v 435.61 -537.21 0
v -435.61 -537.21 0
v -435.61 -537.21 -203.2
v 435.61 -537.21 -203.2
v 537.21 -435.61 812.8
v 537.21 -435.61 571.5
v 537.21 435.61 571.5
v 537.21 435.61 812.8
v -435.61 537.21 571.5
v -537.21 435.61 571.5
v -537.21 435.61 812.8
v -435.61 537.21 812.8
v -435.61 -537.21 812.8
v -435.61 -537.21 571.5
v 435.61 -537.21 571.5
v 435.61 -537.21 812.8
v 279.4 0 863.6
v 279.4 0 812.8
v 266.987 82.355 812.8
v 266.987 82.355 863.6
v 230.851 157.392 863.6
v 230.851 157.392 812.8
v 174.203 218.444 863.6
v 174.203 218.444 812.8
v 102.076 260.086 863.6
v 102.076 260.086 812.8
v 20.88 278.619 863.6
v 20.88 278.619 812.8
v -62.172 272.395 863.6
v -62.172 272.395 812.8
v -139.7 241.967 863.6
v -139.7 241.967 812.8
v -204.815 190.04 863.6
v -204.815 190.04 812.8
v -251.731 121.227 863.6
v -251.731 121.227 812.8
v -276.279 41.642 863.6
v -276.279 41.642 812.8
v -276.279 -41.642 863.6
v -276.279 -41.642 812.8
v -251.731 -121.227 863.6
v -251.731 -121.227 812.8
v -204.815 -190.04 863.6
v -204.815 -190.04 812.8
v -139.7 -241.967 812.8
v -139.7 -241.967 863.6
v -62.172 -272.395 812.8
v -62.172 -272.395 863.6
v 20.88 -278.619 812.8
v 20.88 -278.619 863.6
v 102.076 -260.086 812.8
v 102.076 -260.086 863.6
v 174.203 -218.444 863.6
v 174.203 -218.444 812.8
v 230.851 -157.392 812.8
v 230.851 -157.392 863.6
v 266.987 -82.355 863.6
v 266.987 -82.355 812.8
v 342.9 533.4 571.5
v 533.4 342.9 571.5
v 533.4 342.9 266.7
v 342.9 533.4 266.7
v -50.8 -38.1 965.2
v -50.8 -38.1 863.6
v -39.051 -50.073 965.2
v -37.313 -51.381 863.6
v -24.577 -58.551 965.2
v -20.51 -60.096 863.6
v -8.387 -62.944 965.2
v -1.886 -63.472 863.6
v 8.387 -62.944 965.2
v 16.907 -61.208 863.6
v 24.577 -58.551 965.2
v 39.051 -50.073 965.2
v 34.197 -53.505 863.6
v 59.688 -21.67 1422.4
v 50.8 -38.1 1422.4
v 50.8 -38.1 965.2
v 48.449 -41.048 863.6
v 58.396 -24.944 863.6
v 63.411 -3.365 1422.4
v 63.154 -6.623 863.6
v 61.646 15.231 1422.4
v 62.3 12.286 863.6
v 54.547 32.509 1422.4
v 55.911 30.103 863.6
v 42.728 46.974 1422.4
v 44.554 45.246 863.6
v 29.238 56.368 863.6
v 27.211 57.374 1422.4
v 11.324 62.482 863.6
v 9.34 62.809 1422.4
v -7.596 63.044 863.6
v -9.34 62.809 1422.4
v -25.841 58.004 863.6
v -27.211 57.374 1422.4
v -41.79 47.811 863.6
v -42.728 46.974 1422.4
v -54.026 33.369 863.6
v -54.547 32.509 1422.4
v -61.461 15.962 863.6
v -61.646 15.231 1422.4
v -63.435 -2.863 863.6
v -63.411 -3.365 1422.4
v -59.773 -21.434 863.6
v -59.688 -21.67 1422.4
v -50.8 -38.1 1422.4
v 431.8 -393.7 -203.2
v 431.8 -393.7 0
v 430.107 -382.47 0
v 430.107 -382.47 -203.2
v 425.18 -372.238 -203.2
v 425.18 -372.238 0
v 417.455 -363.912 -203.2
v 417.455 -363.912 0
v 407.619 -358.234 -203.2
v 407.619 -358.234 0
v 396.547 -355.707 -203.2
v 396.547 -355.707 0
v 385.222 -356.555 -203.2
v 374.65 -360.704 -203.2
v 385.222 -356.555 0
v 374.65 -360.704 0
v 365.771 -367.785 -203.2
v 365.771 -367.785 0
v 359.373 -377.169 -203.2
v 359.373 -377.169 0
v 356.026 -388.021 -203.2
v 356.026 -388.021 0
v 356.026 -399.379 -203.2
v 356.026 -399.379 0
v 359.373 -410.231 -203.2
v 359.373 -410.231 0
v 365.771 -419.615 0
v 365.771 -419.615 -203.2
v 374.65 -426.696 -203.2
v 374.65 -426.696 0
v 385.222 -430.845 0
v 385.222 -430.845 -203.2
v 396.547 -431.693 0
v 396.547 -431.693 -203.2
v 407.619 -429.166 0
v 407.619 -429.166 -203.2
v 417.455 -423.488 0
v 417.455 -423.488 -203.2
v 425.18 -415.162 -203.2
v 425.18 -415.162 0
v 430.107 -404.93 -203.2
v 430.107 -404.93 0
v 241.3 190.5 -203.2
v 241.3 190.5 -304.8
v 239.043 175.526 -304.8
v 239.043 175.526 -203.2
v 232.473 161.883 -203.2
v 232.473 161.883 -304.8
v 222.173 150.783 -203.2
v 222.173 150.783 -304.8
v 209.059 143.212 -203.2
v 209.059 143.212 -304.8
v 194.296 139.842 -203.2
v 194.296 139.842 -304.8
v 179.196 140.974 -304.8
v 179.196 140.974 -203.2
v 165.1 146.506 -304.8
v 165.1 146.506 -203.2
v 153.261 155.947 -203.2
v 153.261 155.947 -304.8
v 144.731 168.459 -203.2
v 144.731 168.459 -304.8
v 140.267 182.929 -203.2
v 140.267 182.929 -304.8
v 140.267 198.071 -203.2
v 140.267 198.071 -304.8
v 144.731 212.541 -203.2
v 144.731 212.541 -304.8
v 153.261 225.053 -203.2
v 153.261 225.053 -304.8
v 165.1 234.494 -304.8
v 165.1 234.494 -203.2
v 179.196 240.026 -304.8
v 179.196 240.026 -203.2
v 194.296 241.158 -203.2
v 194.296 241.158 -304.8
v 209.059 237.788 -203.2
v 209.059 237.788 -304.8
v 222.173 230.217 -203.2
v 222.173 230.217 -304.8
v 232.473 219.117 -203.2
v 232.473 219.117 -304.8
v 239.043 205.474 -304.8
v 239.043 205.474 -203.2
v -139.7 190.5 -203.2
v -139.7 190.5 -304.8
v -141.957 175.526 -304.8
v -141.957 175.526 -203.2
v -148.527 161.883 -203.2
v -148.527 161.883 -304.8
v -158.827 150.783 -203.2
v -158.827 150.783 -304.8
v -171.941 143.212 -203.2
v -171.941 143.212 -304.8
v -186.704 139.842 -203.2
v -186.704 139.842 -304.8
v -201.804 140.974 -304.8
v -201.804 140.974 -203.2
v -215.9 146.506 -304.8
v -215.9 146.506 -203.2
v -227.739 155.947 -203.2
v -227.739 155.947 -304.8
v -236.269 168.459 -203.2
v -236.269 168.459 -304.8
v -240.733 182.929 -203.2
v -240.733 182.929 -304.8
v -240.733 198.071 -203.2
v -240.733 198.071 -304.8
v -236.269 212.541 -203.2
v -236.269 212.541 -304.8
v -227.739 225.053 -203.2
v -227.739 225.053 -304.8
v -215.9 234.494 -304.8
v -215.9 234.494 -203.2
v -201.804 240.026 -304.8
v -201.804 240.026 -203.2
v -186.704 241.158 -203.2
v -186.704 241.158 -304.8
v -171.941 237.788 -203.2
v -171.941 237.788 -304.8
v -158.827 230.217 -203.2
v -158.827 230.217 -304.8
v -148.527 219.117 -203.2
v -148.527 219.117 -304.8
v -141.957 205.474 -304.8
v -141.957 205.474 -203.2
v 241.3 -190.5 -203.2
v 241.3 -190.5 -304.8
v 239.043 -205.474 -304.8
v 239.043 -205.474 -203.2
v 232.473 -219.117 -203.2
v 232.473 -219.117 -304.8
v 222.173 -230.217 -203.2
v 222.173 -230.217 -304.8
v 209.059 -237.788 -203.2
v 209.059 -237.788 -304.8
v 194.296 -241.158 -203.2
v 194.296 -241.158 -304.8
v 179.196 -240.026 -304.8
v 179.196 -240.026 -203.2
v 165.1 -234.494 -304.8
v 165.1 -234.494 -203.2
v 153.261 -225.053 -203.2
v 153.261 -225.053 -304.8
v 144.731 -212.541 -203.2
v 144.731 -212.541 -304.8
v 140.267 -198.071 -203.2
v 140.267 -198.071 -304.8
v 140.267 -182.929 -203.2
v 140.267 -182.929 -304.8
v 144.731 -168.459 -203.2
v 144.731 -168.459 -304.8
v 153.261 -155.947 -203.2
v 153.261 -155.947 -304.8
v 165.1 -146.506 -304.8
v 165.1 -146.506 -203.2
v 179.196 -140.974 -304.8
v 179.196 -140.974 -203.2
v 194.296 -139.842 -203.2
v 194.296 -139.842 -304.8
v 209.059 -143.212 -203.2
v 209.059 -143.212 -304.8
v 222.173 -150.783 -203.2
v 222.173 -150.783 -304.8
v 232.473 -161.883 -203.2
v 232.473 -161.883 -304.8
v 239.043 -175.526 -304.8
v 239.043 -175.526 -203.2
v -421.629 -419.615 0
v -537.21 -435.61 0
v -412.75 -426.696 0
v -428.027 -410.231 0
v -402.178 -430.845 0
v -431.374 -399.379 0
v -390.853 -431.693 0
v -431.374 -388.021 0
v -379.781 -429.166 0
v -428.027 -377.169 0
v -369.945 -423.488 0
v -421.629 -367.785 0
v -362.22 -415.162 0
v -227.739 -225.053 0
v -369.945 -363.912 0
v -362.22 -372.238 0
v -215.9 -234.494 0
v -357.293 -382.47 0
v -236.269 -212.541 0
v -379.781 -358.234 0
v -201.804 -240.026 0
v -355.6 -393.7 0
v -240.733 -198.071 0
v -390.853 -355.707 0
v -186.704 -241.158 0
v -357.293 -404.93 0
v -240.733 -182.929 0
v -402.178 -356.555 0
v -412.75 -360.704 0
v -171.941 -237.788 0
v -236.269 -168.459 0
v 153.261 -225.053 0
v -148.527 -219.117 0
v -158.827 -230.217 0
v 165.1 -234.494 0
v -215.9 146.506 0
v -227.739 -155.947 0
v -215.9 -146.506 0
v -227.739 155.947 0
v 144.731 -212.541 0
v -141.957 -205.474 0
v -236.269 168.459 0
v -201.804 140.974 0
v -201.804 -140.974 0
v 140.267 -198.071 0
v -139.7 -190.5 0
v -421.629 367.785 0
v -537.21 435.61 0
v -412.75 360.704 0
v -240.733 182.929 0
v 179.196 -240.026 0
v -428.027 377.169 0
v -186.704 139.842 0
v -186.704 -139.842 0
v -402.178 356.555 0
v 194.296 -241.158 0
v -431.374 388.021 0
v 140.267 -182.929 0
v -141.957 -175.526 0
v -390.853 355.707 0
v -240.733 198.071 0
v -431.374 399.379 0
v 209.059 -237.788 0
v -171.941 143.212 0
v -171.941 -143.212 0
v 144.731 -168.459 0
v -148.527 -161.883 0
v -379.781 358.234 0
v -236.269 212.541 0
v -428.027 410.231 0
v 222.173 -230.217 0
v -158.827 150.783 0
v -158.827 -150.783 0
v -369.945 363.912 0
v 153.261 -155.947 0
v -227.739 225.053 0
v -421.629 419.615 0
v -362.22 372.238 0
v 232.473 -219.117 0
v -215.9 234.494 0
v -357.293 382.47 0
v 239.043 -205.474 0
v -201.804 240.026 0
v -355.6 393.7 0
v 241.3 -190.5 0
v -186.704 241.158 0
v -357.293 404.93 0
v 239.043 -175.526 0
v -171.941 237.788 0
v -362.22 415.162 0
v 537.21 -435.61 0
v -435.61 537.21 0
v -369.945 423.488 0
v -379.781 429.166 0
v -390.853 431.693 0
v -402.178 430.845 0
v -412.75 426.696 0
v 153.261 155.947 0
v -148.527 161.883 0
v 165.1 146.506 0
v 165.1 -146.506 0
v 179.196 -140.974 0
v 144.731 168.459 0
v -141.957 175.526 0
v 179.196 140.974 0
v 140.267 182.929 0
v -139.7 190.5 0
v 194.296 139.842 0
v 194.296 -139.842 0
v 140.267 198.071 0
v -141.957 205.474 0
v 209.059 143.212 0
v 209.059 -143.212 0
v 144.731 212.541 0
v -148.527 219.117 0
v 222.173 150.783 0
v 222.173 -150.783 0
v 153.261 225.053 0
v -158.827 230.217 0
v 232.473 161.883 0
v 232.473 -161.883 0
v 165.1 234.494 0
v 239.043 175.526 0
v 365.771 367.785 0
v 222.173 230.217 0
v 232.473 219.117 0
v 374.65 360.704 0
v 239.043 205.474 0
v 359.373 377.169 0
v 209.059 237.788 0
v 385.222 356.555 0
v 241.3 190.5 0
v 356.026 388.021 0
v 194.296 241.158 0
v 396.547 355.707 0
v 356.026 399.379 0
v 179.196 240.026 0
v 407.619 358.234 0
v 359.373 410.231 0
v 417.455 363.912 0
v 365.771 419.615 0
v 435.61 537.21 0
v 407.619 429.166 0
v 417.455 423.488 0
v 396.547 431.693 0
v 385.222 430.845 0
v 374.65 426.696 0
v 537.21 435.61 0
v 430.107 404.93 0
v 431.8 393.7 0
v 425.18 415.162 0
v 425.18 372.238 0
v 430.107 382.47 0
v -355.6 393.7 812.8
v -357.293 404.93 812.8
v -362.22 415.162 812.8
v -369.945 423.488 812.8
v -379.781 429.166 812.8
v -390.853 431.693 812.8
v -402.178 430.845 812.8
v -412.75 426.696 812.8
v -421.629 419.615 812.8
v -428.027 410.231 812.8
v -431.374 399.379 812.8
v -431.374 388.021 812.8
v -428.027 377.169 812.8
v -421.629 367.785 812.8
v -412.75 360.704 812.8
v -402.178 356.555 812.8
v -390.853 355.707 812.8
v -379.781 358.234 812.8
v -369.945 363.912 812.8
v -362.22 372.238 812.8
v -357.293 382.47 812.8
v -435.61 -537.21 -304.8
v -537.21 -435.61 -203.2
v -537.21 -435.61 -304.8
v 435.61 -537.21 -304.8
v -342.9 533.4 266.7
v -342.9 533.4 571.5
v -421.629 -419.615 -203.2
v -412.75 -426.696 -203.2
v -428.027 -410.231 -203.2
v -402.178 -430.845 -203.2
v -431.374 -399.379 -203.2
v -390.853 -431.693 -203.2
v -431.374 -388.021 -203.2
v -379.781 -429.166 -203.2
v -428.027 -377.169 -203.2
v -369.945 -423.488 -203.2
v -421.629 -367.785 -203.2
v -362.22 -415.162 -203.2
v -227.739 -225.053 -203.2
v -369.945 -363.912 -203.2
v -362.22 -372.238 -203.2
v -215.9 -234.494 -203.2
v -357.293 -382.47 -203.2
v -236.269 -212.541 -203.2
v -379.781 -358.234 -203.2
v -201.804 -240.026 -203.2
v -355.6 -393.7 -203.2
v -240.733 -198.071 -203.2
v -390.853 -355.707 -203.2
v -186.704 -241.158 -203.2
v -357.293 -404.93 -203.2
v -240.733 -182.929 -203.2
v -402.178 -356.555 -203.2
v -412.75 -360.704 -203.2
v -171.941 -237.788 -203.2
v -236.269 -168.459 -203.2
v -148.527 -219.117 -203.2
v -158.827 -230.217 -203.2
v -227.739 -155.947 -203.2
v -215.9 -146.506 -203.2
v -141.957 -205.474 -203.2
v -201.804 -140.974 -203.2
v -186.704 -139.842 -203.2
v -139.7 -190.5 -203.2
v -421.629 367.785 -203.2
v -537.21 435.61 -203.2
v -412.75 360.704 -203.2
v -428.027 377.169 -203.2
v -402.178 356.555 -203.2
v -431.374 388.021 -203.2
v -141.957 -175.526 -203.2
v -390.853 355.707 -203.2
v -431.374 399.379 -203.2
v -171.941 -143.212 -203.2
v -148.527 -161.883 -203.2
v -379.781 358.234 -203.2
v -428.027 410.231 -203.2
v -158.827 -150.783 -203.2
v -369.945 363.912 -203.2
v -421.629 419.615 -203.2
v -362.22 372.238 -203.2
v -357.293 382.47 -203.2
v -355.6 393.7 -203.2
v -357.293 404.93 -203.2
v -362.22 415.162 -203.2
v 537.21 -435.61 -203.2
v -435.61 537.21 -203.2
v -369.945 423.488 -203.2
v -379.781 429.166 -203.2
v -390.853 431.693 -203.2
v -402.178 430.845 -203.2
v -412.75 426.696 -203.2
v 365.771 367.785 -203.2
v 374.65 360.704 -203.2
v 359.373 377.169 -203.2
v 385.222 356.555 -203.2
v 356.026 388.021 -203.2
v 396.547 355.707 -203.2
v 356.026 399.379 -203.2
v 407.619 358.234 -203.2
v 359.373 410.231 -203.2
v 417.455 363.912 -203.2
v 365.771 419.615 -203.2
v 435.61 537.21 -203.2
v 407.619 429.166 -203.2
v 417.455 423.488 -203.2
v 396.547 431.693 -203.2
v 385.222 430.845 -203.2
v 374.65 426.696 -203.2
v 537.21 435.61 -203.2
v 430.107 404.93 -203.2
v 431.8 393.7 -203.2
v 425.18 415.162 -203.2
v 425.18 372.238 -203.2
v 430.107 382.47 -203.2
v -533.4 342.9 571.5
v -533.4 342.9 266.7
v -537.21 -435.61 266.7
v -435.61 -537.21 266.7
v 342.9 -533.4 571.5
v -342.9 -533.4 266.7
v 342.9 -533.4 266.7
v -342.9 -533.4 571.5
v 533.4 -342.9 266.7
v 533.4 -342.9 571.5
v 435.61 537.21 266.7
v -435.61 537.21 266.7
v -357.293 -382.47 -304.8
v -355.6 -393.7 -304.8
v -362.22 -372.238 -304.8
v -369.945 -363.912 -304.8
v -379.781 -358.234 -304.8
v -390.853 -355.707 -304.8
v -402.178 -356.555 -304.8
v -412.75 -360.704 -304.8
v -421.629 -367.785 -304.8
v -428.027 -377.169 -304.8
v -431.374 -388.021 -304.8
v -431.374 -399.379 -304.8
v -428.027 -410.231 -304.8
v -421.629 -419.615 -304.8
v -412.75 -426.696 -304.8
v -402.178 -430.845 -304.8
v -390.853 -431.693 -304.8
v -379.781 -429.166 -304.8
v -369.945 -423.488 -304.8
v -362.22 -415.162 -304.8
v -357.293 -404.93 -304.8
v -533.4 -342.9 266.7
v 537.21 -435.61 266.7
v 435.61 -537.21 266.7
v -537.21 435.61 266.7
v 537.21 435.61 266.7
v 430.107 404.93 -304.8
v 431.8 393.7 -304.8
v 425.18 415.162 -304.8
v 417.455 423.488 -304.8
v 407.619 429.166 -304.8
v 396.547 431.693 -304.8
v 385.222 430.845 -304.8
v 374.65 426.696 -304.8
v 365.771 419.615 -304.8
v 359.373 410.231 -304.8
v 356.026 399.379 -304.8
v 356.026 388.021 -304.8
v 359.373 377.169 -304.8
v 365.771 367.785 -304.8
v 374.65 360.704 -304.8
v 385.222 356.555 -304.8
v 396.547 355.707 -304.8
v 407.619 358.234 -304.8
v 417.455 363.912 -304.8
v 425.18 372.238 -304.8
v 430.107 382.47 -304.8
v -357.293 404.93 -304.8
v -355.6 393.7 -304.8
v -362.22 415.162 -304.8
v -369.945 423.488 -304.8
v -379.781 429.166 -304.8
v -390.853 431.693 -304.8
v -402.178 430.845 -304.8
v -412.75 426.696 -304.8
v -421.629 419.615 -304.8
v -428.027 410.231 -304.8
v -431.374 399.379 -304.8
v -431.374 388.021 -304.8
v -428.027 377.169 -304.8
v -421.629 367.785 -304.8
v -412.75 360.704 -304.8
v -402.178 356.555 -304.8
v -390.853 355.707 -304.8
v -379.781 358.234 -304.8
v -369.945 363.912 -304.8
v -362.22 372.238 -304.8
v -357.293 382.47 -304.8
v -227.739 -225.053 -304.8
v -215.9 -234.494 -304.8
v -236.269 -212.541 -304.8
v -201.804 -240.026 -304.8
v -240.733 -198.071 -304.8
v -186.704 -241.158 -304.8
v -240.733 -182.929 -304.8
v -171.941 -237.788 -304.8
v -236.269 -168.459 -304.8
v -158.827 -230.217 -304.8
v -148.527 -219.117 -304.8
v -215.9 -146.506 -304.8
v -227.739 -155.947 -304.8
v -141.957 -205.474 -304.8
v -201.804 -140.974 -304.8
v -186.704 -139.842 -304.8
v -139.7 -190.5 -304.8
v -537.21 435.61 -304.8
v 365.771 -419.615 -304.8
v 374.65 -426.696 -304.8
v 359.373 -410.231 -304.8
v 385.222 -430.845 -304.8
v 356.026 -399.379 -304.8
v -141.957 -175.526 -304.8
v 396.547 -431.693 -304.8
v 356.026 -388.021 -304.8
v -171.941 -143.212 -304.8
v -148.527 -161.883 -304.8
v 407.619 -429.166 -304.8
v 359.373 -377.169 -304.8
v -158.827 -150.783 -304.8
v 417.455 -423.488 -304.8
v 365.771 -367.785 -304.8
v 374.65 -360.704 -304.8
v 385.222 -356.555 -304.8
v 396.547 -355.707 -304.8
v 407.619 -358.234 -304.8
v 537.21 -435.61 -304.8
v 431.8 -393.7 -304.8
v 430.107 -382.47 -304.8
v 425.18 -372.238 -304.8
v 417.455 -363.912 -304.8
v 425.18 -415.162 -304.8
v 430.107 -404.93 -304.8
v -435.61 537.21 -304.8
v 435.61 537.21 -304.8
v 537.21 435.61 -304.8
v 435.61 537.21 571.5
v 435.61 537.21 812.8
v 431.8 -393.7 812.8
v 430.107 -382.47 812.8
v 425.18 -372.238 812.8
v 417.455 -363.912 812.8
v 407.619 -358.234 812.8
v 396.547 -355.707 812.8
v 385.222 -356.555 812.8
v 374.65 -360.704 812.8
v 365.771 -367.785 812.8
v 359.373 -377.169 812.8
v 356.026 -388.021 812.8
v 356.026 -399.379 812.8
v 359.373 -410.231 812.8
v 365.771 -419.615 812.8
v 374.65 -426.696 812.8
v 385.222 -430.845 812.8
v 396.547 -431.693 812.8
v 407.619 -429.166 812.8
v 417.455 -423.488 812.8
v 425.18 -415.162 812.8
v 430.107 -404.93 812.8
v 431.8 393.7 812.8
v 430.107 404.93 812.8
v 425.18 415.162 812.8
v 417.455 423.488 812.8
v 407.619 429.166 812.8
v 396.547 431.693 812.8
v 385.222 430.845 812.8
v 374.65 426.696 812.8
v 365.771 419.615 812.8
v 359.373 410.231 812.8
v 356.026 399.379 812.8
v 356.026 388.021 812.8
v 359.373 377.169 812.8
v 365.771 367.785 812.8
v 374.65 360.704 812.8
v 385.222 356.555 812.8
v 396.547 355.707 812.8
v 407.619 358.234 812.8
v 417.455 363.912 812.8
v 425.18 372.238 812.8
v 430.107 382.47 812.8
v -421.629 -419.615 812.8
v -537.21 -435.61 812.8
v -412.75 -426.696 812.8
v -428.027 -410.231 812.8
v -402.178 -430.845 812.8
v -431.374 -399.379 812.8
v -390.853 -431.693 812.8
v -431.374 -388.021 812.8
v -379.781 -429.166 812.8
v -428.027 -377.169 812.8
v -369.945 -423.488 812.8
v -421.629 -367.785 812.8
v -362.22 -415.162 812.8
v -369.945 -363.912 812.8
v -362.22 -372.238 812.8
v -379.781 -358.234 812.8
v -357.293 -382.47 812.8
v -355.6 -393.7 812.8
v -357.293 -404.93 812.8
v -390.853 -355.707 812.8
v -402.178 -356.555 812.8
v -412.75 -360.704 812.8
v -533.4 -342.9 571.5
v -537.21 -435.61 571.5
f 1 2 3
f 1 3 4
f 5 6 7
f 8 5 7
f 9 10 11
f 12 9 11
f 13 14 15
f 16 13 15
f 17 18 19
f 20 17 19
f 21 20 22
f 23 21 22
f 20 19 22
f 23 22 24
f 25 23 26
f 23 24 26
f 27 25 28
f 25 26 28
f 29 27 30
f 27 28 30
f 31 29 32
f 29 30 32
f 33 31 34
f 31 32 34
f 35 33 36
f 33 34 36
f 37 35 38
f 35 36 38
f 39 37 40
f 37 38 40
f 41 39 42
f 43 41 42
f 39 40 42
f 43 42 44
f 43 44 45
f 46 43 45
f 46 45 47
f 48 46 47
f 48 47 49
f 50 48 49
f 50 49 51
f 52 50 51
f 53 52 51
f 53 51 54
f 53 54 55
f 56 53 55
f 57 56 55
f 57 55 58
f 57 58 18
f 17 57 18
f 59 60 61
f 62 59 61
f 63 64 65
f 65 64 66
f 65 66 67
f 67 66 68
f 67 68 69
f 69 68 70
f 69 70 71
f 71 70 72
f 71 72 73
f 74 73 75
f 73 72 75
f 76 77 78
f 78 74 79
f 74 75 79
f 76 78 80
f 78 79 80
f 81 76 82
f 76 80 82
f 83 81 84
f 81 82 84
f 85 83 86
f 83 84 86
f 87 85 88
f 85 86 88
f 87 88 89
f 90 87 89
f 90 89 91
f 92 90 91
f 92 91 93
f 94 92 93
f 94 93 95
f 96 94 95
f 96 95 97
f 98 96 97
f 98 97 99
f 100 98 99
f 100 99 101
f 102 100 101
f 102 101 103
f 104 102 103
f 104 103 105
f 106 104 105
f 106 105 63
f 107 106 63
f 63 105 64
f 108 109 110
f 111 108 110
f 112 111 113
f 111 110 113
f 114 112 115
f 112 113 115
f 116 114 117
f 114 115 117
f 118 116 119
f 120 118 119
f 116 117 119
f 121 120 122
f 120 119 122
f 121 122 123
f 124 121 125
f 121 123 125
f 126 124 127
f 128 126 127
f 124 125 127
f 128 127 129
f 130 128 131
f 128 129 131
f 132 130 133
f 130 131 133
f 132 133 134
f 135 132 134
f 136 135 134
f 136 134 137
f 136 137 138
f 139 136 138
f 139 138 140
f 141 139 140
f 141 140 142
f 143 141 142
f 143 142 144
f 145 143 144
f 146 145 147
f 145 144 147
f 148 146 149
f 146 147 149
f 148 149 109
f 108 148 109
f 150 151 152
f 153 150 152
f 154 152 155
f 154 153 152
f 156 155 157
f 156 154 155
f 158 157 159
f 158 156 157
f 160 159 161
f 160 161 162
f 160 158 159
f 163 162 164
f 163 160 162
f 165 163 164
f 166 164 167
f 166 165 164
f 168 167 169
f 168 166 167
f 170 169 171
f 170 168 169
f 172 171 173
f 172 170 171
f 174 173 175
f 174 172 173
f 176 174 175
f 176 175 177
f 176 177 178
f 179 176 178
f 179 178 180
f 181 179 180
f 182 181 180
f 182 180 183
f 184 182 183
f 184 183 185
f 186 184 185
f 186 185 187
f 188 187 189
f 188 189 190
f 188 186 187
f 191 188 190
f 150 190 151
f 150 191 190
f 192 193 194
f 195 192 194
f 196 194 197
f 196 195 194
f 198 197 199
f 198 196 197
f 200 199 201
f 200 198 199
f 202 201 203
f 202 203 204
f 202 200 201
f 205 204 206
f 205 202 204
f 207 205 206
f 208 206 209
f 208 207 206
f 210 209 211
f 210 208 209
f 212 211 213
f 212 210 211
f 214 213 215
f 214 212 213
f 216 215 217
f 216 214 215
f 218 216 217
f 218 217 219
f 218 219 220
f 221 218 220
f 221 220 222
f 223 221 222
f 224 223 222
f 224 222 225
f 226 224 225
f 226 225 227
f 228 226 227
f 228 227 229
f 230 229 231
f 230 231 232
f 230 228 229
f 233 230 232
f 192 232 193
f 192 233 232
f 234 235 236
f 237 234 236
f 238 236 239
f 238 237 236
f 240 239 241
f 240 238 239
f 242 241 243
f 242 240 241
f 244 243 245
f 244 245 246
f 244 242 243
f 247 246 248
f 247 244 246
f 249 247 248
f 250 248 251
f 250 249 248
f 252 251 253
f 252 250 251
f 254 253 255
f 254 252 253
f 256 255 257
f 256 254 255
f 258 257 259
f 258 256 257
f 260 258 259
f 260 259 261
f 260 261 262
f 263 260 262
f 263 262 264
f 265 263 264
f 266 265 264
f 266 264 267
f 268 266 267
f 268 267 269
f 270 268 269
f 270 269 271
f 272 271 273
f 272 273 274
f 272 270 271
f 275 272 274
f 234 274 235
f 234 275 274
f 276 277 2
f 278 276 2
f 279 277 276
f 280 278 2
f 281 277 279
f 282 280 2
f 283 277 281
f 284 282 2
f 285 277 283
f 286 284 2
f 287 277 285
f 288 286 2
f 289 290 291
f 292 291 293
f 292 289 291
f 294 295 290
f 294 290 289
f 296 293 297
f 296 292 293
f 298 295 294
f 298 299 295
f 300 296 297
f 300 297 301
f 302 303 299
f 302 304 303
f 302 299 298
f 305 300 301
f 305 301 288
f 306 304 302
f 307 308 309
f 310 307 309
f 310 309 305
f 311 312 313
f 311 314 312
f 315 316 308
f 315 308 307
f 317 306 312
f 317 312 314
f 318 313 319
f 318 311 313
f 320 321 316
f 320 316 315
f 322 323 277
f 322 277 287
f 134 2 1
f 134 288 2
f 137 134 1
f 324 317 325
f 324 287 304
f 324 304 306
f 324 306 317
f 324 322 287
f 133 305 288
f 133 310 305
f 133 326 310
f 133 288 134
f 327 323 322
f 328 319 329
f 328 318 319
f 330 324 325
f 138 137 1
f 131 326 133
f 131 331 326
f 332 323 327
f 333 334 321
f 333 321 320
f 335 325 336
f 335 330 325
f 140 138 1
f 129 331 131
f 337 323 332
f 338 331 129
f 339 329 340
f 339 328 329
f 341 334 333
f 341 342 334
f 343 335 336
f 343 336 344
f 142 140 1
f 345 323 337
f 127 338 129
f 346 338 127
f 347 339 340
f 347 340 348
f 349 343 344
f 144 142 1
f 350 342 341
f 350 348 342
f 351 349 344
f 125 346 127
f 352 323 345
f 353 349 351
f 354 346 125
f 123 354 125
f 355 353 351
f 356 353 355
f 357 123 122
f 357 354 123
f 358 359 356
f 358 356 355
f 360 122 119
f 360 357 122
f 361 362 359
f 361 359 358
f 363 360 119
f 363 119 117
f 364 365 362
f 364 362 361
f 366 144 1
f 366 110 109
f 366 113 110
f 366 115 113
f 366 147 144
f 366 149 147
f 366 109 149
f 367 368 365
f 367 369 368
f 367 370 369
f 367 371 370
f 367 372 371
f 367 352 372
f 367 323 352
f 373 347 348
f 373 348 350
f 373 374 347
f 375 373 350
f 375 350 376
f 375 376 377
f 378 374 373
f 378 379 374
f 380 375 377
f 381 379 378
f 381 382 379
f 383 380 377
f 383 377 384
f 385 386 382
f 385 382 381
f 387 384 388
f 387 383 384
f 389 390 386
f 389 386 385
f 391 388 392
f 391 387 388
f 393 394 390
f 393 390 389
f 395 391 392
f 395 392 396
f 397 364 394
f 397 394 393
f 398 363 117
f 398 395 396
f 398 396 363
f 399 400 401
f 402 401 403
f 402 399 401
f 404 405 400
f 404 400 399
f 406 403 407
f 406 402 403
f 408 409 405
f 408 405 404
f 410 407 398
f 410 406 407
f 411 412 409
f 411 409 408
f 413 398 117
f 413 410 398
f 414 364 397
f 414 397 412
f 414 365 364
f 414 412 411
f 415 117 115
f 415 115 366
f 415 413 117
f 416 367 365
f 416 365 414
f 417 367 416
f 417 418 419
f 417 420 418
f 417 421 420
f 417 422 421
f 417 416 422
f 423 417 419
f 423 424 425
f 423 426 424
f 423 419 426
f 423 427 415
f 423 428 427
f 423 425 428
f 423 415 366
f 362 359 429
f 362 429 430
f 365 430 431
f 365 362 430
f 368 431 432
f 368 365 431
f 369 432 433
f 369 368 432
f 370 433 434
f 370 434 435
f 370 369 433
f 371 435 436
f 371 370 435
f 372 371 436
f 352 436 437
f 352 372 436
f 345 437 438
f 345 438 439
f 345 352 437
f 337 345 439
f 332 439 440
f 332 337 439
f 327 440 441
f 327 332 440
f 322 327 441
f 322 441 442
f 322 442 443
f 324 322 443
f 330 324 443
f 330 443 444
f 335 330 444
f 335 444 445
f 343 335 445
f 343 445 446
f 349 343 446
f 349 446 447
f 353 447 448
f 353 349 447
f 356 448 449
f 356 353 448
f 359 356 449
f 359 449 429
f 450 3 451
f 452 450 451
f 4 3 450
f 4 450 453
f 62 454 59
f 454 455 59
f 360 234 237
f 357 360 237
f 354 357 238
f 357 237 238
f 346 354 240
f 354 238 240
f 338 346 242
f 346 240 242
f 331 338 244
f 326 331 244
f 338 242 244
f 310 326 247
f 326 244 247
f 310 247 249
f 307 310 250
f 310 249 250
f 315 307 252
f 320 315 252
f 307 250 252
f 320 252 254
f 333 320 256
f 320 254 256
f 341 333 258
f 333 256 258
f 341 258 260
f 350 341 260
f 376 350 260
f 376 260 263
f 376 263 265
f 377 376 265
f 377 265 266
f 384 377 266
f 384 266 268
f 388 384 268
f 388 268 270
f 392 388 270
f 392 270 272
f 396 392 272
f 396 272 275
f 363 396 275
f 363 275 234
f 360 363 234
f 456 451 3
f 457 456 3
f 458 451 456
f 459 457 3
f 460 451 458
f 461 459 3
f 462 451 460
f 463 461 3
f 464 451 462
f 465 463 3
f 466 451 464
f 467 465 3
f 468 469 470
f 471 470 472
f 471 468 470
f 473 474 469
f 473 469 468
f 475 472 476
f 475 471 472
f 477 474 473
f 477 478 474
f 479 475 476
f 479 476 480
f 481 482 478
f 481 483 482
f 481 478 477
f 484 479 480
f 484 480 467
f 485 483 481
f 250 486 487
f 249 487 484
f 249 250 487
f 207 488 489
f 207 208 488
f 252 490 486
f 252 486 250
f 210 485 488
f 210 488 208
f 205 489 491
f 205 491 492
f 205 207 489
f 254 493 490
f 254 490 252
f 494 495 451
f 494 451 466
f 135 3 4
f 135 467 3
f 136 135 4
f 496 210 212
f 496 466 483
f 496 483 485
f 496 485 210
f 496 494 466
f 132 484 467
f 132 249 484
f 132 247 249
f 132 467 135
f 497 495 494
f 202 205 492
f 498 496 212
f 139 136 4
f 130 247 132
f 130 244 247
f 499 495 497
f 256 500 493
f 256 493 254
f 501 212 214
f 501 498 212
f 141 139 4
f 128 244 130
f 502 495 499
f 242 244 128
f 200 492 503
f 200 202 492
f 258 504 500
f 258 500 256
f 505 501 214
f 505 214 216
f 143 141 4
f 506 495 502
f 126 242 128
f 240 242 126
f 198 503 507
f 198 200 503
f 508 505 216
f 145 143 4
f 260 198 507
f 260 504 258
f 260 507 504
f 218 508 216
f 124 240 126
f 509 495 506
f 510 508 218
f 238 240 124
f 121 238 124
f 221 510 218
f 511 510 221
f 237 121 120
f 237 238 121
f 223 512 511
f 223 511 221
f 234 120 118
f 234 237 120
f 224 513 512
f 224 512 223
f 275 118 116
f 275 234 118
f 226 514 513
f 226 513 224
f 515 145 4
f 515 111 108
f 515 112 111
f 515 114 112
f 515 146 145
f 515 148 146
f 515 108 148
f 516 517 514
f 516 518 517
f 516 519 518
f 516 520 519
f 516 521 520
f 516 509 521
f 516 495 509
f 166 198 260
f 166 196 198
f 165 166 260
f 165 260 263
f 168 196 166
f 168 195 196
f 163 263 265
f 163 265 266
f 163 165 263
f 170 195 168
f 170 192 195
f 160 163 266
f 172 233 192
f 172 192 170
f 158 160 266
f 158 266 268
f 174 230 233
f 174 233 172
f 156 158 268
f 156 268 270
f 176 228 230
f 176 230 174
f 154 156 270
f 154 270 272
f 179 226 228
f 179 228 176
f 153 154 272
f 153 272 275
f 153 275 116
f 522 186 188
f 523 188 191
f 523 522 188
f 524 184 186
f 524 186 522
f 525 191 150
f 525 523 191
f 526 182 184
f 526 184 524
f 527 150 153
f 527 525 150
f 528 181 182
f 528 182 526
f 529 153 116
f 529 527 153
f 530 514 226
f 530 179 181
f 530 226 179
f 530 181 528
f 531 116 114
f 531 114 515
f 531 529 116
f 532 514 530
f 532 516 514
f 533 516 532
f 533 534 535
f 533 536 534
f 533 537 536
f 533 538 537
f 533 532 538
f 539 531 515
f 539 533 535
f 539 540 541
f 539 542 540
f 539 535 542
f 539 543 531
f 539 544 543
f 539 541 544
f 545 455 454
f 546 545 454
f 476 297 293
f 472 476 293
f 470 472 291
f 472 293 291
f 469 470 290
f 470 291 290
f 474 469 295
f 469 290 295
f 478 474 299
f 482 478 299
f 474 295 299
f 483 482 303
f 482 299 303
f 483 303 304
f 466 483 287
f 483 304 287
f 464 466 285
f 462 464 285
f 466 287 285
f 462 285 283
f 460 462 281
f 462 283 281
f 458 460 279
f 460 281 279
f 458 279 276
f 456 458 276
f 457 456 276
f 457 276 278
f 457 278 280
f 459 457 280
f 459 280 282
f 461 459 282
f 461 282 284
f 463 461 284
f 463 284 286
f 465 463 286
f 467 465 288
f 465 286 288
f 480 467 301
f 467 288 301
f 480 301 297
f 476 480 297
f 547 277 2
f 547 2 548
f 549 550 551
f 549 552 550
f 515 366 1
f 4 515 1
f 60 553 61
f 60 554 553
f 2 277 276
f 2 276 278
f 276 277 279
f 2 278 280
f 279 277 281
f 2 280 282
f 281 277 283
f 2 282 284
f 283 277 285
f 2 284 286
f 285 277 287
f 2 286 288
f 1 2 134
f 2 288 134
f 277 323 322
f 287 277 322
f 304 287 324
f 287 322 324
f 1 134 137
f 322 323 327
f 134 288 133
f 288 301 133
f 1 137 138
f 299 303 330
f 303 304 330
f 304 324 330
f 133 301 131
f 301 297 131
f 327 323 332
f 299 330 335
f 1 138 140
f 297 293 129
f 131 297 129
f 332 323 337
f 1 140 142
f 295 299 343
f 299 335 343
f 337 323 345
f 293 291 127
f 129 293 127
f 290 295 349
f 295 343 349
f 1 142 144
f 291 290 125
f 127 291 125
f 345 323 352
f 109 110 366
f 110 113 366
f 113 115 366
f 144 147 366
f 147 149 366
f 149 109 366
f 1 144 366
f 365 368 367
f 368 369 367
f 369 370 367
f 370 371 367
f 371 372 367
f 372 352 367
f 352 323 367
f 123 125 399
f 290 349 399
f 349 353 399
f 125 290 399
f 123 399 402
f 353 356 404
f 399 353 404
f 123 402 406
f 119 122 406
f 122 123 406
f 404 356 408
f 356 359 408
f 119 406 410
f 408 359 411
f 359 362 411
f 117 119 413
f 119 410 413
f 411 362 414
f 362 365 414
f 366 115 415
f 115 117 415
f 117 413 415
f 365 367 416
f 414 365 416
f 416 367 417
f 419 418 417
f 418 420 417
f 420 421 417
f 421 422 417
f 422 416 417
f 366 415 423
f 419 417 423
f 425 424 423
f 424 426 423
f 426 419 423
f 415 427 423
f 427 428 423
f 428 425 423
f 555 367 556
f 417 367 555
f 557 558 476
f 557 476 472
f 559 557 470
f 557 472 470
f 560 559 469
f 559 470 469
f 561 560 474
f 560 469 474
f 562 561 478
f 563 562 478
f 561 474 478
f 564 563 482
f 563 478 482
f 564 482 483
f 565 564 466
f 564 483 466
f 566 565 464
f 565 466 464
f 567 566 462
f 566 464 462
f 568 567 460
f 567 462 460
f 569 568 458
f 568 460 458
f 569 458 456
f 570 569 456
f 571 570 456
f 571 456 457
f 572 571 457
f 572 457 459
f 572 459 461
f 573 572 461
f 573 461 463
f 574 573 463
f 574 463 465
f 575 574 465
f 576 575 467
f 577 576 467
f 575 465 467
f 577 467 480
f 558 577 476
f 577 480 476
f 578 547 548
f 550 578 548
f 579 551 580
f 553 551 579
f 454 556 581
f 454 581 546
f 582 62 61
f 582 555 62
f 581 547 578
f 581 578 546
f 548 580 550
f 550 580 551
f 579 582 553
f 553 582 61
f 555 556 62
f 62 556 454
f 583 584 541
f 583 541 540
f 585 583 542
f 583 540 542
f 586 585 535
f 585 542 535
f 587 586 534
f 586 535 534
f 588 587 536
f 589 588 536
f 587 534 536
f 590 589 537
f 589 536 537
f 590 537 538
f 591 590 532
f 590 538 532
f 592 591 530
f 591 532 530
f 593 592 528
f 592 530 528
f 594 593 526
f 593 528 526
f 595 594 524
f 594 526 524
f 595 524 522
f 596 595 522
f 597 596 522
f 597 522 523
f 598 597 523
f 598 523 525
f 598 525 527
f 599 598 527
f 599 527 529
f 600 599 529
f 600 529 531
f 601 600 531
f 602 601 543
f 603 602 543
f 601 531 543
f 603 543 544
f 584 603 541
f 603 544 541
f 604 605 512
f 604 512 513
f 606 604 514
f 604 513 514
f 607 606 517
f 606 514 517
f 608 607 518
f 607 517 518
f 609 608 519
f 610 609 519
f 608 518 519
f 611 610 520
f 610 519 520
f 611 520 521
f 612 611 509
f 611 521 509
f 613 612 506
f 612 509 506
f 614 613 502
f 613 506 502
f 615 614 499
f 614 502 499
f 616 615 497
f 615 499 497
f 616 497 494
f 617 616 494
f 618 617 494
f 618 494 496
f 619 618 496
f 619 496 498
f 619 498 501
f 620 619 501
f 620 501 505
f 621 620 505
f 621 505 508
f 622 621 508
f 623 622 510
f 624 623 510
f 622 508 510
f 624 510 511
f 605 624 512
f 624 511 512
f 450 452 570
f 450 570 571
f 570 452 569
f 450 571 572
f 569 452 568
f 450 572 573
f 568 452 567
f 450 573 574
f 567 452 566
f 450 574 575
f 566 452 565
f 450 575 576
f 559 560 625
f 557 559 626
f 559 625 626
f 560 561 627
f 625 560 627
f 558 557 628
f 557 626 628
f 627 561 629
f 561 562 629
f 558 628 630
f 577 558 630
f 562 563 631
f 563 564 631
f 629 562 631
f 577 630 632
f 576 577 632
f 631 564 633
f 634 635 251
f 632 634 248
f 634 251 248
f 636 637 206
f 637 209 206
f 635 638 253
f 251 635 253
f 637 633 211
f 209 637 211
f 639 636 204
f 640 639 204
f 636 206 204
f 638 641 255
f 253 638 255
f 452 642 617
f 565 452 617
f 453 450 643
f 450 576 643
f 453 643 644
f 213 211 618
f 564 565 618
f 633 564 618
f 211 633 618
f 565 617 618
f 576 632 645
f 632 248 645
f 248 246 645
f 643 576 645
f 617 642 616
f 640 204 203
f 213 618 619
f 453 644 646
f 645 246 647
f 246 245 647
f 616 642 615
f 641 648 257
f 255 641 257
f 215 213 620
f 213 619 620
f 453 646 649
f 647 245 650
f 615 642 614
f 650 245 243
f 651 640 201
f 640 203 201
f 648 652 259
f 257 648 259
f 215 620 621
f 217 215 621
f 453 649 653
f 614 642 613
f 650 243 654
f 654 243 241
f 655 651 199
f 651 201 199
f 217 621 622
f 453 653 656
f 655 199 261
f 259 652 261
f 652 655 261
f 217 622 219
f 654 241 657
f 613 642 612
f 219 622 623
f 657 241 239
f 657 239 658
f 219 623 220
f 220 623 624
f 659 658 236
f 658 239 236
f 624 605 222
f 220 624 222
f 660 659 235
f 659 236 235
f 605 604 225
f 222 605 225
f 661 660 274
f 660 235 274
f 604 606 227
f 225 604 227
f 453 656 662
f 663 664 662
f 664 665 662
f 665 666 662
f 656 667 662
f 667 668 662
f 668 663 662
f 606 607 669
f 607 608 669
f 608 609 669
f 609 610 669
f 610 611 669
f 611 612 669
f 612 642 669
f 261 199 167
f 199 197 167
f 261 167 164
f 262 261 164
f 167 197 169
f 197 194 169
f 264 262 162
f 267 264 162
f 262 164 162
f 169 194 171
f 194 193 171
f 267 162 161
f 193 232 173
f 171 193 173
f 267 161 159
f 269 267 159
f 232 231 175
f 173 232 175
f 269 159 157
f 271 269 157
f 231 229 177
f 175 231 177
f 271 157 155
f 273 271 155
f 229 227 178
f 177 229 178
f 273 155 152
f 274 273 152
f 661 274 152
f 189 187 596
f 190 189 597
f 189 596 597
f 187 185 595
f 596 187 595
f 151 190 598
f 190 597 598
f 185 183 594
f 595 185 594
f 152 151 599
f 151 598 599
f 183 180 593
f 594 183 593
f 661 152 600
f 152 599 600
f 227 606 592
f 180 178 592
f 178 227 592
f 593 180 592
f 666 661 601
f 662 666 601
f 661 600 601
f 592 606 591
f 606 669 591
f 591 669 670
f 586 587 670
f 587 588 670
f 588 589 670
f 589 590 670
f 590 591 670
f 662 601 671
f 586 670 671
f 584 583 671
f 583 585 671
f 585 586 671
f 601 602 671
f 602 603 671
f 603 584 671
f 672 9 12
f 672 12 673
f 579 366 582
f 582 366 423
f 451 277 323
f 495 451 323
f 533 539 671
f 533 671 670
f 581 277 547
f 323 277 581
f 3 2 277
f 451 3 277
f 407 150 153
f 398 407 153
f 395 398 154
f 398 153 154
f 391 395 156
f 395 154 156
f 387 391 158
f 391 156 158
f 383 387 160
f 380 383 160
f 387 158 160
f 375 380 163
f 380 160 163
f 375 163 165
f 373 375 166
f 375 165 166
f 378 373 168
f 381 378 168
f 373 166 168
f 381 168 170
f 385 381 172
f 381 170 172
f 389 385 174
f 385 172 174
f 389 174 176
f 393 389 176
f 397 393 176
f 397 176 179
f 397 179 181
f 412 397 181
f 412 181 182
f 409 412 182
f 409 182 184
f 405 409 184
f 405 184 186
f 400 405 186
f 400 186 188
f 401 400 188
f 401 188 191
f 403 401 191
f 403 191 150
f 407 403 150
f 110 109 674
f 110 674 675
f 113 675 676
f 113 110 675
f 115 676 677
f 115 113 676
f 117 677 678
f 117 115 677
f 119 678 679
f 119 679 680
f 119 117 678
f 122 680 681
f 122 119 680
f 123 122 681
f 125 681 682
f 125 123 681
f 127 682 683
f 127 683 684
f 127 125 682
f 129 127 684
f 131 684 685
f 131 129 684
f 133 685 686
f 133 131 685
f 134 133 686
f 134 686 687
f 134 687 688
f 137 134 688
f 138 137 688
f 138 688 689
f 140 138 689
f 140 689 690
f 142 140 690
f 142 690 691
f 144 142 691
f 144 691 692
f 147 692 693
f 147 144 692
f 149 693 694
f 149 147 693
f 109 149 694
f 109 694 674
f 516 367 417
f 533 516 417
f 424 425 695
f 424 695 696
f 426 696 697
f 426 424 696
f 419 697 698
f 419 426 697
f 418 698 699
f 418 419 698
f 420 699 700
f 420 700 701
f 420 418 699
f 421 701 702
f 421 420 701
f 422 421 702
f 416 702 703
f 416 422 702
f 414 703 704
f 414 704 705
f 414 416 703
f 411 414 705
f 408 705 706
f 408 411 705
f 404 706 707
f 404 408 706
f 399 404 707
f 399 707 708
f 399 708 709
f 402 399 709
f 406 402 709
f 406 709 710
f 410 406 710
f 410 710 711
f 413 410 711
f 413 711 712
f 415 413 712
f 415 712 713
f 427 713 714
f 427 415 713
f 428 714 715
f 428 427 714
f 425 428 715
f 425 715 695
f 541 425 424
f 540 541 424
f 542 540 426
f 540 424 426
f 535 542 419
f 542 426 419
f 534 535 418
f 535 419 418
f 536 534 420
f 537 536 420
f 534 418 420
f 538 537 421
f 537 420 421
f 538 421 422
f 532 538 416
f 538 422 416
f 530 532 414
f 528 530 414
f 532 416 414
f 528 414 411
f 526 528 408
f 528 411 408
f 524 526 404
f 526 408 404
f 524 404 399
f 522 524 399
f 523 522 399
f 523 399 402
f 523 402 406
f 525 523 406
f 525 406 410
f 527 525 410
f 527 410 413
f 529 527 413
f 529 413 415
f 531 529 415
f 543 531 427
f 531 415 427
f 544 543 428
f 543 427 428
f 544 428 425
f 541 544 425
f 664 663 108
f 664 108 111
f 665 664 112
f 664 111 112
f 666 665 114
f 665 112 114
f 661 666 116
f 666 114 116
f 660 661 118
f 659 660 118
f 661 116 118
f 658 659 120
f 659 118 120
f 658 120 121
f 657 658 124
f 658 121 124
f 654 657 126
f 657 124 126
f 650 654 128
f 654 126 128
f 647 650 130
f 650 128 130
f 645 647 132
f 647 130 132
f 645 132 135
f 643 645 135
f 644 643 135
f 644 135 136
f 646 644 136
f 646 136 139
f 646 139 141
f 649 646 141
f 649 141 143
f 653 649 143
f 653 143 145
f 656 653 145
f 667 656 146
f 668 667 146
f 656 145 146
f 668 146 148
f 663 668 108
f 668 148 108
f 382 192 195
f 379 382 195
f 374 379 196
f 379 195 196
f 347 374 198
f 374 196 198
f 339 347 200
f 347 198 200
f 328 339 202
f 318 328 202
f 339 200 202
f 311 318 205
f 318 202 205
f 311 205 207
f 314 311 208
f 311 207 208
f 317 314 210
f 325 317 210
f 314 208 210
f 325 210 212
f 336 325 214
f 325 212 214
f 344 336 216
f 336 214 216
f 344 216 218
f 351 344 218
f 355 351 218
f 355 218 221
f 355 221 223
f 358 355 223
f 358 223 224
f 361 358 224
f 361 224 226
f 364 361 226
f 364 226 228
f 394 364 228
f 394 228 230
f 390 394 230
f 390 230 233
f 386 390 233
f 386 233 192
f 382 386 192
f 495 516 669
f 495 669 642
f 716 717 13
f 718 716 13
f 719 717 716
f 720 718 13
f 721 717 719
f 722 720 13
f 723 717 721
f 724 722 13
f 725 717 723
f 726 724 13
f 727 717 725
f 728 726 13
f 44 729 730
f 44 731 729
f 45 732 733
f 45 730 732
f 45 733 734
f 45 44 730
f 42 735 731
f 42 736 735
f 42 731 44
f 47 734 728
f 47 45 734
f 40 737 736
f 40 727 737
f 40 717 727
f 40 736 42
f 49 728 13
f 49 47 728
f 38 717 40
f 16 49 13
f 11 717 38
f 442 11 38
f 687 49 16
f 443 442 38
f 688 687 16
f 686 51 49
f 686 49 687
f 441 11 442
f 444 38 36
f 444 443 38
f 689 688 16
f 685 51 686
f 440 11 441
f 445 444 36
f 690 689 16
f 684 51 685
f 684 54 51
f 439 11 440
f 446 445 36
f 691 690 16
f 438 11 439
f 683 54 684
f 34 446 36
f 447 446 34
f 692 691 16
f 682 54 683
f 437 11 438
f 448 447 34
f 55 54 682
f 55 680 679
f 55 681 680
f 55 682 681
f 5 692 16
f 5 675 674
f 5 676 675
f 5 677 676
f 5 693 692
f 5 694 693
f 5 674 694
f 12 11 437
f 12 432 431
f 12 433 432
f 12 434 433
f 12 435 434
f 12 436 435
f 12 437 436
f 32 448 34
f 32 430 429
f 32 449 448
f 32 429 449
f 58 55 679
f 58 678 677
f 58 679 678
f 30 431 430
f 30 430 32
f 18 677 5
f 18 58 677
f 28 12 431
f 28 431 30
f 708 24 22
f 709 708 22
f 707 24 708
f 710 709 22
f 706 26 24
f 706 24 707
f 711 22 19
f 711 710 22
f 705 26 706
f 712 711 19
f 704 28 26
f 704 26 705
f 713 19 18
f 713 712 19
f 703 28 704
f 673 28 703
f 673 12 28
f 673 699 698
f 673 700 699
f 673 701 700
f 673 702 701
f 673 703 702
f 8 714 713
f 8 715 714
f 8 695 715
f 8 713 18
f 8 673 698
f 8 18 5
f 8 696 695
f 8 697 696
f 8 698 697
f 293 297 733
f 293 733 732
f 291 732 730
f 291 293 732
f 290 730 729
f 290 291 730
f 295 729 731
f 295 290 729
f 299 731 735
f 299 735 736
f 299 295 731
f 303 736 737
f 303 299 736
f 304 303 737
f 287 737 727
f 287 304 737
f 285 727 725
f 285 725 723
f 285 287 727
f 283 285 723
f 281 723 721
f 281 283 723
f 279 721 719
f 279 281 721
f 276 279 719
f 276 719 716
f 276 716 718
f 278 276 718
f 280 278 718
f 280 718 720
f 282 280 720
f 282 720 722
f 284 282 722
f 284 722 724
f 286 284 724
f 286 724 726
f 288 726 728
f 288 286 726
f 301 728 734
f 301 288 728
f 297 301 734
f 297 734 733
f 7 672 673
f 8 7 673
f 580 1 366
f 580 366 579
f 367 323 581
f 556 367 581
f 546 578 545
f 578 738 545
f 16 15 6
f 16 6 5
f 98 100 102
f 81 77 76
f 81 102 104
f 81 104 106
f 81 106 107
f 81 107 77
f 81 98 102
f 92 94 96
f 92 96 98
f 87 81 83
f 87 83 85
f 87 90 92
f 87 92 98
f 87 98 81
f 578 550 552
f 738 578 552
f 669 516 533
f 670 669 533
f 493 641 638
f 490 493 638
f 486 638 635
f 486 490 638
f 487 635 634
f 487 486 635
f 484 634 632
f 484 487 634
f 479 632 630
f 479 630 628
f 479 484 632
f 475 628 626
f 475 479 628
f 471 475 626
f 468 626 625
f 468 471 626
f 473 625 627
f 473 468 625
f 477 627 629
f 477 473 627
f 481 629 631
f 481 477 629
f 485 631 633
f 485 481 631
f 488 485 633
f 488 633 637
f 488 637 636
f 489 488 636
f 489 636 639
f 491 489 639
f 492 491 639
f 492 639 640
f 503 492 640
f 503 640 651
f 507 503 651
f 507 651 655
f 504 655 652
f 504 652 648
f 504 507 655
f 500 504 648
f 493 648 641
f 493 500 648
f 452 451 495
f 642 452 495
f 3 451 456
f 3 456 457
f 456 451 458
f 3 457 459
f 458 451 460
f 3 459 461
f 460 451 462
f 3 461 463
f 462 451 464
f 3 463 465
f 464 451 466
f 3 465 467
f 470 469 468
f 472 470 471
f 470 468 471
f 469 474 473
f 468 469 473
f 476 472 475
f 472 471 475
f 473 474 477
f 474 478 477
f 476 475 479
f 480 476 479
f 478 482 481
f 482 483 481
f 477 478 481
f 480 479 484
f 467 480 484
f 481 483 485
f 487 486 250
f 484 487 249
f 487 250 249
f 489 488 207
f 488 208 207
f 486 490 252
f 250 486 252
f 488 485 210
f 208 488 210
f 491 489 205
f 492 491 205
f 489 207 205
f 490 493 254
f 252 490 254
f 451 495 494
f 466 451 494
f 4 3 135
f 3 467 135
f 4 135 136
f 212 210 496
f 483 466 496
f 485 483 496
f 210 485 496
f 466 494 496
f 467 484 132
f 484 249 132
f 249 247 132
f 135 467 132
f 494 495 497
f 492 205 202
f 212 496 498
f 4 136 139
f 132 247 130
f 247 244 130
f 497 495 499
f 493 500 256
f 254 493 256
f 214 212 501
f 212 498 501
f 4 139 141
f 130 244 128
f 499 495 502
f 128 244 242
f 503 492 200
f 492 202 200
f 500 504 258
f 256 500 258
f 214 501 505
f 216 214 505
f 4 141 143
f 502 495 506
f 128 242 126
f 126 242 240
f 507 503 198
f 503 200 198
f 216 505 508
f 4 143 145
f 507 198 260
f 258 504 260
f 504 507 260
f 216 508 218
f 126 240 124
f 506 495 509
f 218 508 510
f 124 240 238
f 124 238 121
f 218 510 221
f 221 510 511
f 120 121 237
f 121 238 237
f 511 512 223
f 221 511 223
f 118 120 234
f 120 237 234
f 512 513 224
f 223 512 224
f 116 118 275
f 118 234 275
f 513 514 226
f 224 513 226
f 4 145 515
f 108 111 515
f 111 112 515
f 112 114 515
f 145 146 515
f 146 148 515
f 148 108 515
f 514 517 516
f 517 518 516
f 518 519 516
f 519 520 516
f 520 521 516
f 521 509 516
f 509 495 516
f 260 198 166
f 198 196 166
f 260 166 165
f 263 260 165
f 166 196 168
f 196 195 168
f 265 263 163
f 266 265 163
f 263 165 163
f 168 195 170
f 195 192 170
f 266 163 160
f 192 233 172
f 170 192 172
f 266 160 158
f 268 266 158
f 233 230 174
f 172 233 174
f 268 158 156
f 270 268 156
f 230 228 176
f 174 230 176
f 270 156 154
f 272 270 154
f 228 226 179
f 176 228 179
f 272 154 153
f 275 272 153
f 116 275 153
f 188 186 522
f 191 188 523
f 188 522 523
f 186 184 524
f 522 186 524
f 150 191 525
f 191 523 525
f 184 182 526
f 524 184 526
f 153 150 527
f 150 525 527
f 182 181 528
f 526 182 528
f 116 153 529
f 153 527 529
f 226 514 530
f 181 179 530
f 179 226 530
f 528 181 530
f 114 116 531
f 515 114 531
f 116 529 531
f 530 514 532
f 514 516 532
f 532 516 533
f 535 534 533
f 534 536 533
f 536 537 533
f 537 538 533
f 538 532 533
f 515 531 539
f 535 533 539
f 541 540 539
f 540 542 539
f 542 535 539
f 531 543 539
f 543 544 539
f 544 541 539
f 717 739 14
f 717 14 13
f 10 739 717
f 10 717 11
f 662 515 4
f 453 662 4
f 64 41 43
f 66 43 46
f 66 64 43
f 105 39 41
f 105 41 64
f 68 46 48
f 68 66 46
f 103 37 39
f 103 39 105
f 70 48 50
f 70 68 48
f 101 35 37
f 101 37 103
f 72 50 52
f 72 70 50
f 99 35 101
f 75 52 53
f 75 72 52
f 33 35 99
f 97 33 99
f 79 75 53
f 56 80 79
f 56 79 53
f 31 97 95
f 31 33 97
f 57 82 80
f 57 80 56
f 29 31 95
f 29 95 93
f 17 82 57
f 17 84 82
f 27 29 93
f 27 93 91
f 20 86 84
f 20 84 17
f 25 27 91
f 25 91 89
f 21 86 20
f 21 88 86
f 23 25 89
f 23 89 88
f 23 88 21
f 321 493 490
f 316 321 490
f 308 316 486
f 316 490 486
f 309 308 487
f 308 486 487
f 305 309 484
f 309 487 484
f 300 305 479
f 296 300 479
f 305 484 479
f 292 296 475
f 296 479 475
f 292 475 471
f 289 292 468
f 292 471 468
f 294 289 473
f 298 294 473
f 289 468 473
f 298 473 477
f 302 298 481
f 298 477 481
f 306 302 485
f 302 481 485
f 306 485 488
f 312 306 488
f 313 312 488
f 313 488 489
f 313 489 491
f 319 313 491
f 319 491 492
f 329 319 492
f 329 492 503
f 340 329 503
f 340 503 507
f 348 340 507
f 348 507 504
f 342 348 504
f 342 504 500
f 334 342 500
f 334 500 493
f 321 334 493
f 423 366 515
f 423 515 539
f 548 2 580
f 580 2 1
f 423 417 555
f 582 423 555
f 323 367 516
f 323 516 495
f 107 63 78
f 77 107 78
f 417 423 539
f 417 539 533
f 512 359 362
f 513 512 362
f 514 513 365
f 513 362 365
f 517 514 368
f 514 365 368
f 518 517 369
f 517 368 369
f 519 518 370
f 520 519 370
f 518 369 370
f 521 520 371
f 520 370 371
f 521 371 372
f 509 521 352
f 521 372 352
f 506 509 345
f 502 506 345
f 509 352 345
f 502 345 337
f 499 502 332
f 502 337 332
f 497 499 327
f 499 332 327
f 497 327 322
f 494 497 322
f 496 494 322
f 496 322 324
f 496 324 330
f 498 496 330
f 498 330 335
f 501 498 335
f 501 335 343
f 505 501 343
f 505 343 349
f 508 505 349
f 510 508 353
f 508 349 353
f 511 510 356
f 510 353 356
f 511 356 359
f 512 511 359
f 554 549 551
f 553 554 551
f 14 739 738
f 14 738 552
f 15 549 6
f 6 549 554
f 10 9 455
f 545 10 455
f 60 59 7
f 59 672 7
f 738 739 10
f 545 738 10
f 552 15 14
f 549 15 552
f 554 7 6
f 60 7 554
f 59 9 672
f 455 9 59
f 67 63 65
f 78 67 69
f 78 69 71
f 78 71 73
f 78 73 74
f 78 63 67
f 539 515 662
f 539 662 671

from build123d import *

# Parameters (mm, degrees)
F0_W      = 1074.42
F0_H      = 1074.42
F0_R      = 38.1
F0_R_2    = 279.4
F1_DEPTH  = 812.8
F2_DEPTH  = 863.6
F3_DEPTH  = 965.2
F4_DEPTH  = 1422.4
F5_SIZE   = 101.6
F7_W      = 1270
F7_H      = 1270
F7_W_2    = 1066.8
F7_H_2    = 1066.8
F8_DEPTH  = 152.4
F9_SIZE   = 190.5
F11_DEPTH = 203.2
F12_R     = 50.8
F13_DEPTH = 485.14
F14_DEPTH = 101.6


with BuildPart() as f1:
    # F0 (on Top) → F1 (new body)
    with BuildSketch(Plane.XY):
        Rectangle(F0_W, F0_H)
        with Locations((-393.7, -393.7)):
            Circle(F0_R, mode=Mode.SUBTRACT)
        with Locations((393.7, -393.7)):
            Circle(F0_R, mode=Mode.SUBTRACT)
        with Locations((-393.7, 393.7)):
            Circle(F0_R, mode=Mode.SUBTRACT)
        Circle(F0_R_2, mode=Mode.SUBTRACT)
        with Locations((393.7, 393.7)):
            Circle(F0_R, mode=Mode.SUBTRACT)
    extrude(amount=F1_DEPTH)

    # F0 (on Top) → F2 (join)
    with BuildSketch(Plane.XY):
        Circle(F0_R_2)
        with BuildLine():
            ThreePointArc((-50.8, -38.1), (-20.0804631421, 60.2413894262), (63.5, 0))
            ThreePointArc((63.5, 0), (60.2413894262, -20.0804631421), (50.8, -38.1))
            ThreePointArc((50.8, -38.1), (0, -63.5), (-50.8, -38.1))
        make_face(mode=Mode.SUBTRACT)
    extrude(amount=F2_DEPTH)

    # F0 (on Top) → F3 (join)
    with BuildSketch(Plane.XY):
        with BuildLine():
            ThreePointArc((50.8, -38.1), (60.2413894262, -20.0804631421), (63.5, 0))
            ThreePointArc((63.5, 0), (-20.0804631421, 60.2413894262), (-50.8, -38.1))
            Line((-50.8, -38.1), (50.8, -38.1))
        make_face()
        with BuildLine():
            Line((50.8, -38.1), (-50.8, -38.1))
            ThreePointArc((-50.8, -38.1), (0, -63.5), (50.8, -38.1))
        make_face()
    extrude(amount=F3_DEPTH)

    # F0 (on Top) → F4 (join)
    with BuildSketch(Plane.XY):
        with BuildLine():
            ThreePointArc((50.8, -38.1), (60.2413894262, -20.0804631421), (63.5, 0))
            ThreePointArc((63.5, 0), (-20.0804631421, 60.2413894262), (-50.8, -38.1))
            Line((-50.8, -38.1), (50.8, -38.1))
        make_face()
    extrude(amount=F4_DEPTH)

    # F5
    f5_edges = [f1.edges().sort_by_distance(p)[0] for p in [
        (-537.21, -537.21, 406.4),
        (537.21, -537.21, 406.4),
        (537.21, 537.21, 406.4),
        (-537.21, 537.21, 406.4),
    ]]
    chamfer(f5_edges, length=F5_SIZE)


with BuildPart() as f8:
    # F7 (on offset) → F8 (new body, symmetric)
    with BuildSketch(Plane.XY.offset(419.1)):
        Rectangle(F7_W, F7_H)
        Rectangle(F7_W_2, F7_H_2, mode=Mode.SUBTRACT)
    extrude(amount=F8_DEPTH, both=True)

    # F9
    f9_edges = [f8.edges().sort_by_distance(p)[0] for p in [
        (533.4, -533.4, 419.1),
        (533.4, 533.4, 419.1),
        (-533.4, 533.4, 419.1),
        (-533.4, -533.4, 419.1),
    ]]
    chamfer(f9_edges, length=F9_SIZE)


with BuildPart() as f1_1:
    add(f1.part)

    # F10: cut F8
    add(f8.part, mode=Mode.SUBTRACT)


with BuildPart() as f11:
    # F11 (new): a face of the model
    f11_faces = [f1_1.part.faces().sort_by_distance(p)[0] for p in [
        (0, 0, 0),
    ]]
    extrude(f11_faces, amount=F11_DEPTH)

    # F12 (on face) → F13 (cut)
    with BuildSketch(Plane(origin=(0, 0, -203.2), x_dir=(1, 0, 0), z_dir=(0, 0, -1))):
        with Locations((-190.5, 190.5)):
            Circle(F12_R)
        with Locations((190.5, 190.5)):
            Circle(F12_R)
        with Locations((190.5, -190.5)):
            Circle(F12_R)
        with Locations((-190.5, -190.5)):
            Circle(F12_R)
    extrude(amount=-F13_DEPTH, mode=Mode.SUBTRACT)


with BuildPart() as f14:
    # F14 (new): a face of the model
    f14_faces = [f11.part.faces().sort_by_distance(p)[0] for p in [
        (0, 0, -203.2),
    ]]
    extrude(f14_faces, amount=F14_DEPTH)


solid = Compound([f1_1.part, f11.part, f14.part])
